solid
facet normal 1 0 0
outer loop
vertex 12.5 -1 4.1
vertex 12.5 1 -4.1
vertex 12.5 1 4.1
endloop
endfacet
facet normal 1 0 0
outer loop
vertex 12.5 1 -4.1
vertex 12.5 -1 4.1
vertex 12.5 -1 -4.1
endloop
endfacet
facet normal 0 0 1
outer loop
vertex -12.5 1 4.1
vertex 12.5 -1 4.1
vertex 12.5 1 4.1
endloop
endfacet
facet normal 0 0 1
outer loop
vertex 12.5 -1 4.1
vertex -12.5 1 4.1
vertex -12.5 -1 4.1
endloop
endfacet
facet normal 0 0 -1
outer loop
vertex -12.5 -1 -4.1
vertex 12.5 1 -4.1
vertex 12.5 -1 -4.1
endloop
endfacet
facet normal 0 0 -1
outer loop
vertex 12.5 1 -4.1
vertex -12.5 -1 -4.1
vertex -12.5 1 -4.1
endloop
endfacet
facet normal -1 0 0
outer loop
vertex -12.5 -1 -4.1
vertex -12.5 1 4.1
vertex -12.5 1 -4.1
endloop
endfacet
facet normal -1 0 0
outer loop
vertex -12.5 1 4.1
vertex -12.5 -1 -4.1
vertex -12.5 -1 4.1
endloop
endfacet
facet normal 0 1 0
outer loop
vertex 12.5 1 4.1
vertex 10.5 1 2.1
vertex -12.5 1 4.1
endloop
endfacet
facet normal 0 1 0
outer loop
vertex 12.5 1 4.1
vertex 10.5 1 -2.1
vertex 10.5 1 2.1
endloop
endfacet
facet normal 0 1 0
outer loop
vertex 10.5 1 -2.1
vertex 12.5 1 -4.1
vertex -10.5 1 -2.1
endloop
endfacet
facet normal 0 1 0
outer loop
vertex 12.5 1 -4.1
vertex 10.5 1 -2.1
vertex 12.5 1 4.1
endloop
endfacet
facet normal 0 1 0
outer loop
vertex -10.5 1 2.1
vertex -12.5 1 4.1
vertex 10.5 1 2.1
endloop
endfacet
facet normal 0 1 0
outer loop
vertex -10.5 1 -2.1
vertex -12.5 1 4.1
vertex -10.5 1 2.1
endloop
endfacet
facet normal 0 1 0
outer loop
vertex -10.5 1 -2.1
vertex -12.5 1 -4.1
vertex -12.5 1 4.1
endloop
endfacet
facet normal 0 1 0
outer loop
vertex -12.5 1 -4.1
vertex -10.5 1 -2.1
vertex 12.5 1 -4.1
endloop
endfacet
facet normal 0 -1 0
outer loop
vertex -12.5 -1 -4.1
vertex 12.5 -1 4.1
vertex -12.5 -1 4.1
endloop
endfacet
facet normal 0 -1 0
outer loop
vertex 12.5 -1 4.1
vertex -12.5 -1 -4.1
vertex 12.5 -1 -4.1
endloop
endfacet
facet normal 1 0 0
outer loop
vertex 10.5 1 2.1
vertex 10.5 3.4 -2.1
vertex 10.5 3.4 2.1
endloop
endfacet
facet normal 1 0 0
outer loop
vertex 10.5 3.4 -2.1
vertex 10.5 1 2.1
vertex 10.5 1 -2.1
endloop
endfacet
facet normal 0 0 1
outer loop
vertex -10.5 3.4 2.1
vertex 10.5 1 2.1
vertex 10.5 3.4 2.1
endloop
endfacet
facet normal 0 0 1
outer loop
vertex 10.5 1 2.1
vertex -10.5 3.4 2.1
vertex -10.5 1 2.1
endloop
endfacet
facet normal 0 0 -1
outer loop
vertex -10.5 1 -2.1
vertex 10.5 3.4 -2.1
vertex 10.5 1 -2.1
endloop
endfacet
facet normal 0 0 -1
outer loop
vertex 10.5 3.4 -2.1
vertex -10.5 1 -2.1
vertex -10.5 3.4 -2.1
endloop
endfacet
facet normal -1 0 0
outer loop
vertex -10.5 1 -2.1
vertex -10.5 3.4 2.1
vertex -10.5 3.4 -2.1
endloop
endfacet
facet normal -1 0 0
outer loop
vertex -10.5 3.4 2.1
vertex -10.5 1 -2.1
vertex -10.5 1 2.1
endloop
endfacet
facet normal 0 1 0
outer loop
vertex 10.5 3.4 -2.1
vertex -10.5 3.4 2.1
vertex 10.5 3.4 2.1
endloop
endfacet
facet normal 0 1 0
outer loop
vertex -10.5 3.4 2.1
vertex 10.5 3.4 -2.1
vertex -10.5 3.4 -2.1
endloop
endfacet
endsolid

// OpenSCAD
$fn = 60;
thickness = 2;
mount_internal_radius = 12/2;
mount_radius = 21/2;
mount_outer_radius = mount_radius;
mount_slot_width = 10+0.1;
disk_thinkness = 4.2;
fudge = 0.1;
cube_len = mount_outer_radius*2+2*thickness;


module base()
{
    

    difference() 
    {
       cube([cube_len,cube_len,disk_thinkness+2*thickness], center = true);
        
        /* for testing
       translate([0,cube_len*0.5+2,0])
       # cube([cube_len*2,cube_len*2,cube_len*2],center=true);
        */
    }

}

module slot() {
    
    // The top
    new_h = disk_thinkness + 2;
    
    translate([0,0,disk_thinkness-.1]) { 
        color("blue")
        difference() { 
           cylinder(r=mount_internal_radius, h=new_h);
           for (d = [1,-3]) {
             translate([d*(mount_slot_width/2),-mount_internal_radius,-3])
             cube([mount_slot_width,mount_slot_width,new_h+20],center=false);
           }
        }
        
       // opening
       
       c_len = (mount_slot_width);
       color("green")
       translate([0, -c_len+2, disk_thinkness/2-.1])
          cube([c_len, c_len*2, new_h], center=true); 
        
    }
    
    // The Botton
    
    cylinder(r=mount_radius+fudge, h=disk_thinkness); 
   
    c_len = (mount_radius*2+fudge);
       translate([0, -c_len/2, disk_thinkness/2])
          cube([c_len, c_len, disk_thinkness], center=true);
    
   
}

module body() {
    difference() {
        base();
        translate([0,0,-disk_thinkness/2])
         slot();
        
      //  translate([-20,0,-10])
        //   cube([40,20,20]);
     
       // for lock screw
       translate([-cube_len/2+3.7,-cube_len/2+3.9,0])
        cylinder(r=1.5,h=30, center = true);
        
       translate([cube_len/2-3.7,-cube_len/2+3.9,0])
        cylinder(r=1.5,h=30, center = true);
    }
    

}

module cover() {
    
    difference() 
    {
       cube([cube_len,thickness,disk_thinkness+2*thickness], center = true);

    } 
    translate([0,thickness-.1,0]) 
       cube([cube_len-2*thickness,thickness*1.5,disk_thinkness], center = true);
    
}
cover();
//body();
//slot();

/*
xxx = (mount_radius+0.1)*sin(45)*2;
cube([xxx,xxx,7], center=true);
echo ("xxx", xxx);
*/
